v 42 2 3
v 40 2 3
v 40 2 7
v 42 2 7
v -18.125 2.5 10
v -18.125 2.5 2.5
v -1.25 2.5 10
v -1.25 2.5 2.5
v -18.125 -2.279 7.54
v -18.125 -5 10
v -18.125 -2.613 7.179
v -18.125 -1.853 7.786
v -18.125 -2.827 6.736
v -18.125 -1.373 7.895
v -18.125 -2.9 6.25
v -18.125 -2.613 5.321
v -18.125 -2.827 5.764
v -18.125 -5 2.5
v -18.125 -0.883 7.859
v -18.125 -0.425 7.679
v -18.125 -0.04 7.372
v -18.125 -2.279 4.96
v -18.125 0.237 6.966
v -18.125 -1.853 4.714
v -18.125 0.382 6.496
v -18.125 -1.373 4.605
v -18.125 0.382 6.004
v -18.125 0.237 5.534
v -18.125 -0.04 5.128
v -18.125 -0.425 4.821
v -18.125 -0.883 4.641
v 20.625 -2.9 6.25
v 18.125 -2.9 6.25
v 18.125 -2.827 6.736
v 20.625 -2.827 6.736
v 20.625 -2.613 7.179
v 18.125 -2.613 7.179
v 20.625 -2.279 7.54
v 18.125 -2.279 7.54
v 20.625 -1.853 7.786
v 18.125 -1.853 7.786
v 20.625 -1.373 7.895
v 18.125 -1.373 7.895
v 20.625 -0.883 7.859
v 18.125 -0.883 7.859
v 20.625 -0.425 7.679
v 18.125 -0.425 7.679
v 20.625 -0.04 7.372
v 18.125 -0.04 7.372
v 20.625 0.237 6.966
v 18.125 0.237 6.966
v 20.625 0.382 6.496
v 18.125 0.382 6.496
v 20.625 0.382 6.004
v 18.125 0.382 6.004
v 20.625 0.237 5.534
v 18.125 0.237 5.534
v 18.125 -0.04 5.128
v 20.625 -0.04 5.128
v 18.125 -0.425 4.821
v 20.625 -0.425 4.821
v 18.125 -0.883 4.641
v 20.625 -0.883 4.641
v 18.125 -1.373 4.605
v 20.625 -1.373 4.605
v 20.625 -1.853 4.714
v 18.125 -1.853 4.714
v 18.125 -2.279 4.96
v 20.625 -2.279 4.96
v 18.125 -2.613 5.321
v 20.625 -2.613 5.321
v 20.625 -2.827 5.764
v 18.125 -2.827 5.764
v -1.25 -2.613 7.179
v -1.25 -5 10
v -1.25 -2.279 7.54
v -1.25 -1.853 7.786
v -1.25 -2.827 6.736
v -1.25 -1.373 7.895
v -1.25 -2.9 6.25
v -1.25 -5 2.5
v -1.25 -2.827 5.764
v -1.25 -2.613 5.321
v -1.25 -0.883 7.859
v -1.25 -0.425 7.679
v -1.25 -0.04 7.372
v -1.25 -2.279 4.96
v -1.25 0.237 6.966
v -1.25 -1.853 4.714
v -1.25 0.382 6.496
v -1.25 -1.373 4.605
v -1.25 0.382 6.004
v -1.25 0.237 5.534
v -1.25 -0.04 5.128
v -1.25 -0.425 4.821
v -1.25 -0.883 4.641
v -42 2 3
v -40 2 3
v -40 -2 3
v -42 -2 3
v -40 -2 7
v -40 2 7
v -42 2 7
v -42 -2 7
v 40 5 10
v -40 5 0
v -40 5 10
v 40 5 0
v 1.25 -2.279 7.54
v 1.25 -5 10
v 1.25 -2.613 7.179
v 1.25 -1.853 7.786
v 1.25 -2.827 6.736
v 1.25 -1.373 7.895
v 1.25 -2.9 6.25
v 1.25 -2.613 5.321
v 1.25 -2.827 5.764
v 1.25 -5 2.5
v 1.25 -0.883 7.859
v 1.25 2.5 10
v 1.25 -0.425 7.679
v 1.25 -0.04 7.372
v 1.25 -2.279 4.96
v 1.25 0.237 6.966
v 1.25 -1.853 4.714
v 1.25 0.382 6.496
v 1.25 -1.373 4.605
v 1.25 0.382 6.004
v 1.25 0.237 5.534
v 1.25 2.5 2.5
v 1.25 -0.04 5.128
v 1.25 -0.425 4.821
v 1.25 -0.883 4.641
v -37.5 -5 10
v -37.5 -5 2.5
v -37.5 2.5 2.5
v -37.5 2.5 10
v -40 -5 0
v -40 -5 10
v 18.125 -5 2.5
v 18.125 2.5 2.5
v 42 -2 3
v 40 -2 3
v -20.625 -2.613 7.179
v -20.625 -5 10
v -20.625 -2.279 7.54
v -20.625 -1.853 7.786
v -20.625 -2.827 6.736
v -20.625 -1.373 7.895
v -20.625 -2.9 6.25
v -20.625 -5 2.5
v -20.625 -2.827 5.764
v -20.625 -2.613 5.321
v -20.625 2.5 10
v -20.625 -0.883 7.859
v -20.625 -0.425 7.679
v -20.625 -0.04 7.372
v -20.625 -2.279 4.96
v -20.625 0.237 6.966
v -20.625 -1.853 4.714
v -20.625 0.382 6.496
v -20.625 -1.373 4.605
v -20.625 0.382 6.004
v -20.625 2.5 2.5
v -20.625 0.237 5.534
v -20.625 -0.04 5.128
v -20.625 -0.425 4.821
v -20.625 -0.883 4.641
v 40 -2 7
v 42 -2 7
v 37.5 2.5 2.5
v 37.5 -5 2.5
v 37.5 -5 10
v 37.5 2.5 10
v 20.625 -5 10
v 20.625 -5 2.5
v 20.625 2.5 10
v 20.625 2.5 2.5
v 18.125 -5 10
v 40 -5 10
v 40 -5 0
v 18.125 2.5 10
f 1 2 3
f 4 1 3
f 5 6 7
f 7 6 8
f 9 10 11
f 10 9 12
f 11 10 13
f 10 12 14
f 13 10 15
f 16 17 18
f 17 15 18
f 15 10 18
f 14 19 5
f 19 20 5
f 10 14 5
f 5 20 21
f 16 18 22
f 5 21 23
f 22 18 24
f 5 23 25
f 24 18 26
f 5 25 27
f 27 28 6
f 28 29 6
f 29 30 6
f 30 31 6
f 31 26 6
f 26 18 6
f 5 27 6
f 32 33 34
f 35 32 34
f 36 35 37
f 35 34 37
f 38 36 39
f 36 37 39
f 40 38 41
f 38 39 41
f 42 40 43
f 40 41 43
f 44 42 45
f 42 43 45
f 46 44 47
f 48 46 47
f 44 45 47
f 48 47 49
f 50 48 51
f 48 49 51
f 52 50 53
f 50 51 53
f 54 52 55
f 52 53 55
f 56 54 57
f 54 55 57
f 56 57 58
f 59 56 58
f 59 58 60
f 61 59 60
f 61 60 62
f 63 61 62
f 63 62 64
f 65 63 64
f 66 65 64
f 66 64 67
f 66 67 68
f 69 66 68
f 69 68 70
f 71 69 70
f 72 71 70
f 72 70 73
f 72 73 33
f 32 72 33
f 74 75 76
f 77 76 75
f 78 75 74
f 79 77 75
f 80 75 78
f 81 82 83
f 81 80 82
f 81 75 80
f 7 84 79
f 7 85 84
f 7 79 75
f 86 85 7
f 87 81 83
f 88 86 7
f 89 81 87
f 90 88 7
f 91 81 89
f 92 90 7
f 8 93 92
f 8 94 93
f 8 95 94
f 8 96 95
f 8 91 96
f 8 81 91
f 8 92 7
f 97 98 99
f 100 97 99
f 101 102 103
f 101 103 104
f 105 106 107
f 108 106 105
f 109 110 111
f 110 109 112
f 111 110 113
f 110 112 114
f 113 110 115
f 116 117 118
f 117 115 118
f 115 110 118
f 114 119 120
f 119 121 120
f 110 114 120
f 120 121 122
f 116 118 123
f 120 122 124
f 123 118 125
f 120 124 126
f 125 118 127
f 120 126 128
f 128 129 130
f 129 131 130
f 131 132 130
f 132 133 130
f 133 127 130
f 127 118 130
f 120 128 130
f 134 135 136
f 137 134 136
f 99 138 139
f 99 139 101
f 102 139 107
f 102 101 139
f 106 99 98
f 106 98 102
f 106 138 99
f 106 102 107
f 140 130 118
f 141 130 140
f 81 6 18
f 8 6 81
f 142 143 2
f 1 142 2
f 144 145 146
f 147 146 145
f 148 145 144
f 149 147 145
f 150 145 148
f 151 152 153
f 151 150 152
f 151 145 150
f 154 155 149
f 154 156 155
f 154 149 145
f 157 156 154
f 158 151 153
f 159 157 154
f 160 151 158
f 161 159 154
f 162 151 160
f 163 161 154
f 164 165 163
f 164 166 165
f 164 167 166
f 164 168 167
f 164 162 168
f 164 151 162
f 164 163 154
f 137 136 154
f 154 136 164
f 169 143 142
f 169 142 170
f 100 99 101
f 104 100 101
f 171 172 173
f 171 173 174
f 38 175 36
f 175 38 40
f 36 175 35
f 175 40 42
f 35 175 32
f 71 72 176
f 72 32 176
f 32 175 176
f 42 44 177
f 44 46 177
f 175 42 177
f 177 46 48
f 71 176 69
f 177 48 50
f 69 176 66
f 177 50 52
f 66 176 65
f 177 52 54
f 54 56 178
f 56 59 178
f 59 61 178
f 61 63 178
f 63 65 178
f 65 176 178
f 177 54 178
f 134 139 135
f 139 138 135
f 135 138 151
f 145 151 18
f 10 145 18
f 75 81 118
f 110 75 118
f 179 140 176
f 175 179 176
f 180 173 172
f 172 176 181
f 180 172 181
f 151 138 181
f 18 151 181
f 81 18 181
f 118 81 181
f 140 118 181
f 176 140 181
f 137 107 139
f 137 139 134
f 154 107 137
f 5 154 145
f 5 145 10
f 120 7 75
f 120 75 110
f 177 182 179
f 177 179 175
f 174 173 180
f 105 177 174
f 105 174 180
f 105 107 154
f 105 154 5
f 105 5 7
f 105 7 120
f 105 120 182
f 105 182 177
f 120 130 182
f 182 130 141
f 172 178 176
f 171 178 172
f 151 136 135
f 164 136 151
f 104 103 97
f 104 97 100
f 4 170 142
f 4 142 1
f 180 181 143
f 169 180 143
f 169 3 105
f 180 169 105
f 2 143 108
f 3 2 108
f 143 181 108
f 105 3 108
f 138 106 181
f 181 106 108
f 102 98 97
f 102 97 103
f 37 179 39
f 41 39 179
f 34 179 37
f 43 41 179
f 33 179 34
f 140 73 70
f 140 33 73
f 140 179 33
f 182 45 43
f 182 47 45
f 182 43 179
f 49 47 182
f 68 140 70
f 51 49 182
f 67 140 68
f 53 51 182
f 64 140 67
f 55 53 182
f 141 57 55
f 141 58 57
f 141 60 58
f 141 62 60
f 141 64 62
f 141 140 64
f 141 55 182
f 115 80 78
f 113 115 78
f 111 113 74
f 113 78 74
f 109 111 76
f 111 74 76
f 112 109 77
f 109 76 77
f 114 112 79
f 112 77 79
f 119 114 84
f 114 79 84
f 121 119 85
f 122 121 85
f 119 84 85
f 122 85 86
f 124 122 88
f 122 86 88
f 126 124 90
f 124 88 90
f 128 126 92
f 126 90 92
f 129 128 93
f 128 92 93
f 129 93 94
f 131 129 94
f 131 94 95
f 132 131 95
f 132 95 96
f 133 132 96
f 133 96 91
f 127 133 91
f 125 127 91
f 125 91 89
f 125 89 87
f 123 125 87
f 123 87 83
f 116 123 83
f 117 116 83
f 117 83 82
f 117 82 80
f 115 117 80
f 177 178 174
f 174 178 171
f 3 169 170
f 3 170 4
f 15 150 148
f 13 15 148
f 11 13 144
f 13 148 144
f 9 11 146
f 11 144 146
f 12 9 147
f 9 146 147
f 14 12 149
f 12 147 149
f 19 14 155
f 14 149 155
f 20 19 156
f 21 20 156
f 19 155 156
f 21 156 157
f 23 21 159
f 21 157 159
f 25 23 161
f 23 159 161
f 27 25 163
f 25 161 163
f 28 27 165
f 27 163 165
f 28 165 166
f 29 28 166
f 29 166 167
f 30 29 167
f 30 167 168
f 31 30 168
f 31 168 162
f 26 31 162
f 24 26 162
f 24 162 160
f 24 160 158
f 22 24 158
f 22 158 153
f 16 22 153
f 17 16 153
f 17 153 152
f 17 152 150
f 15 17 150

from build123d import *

# Parameters (mm, degrees)
F0_W      = 80
F0_H      = 10
F1_DEPTH  = 10
F2_W      = 4
F2_H      = 4
F3_DEPTH  = 2
F4_W      = 4
F4_H      = 4
F5_DEPTH  = 2
F6_T      = -2.5
F7_W      = 2.5
F7_H      = 7.5
F8_DEPTH  = 7.5
F9_R      = 1.65
F10_DEPTH = 41.25


with BuildPart() as f1:
    # F0 (on Top) → F1 (new body)
    with BuildSketch(Plane.XY):
        Rectangle(F0_W, F0_H)
    extrude(amount=F1_DEPTH)

    # F2 (on face) → F3 (join)
    with BuildSketch(Plane.YZ.offset(40)):
        with Locations((0, 5)):
            Rectangle(F2_W, F2_H)
    extrude(amount=F3_DEPTH)

    # F4 (on face) → F5 (join)
    with BuildSketch(Plane(origin=(-40, 0, 0), x_dir=(0, -1, 0), z_dir=(-1, 0, 0))):
        with Locations((0, 5)):
            Rectangle(F4_W, F4_H)
    extrude(amount=F5_DEPTH)

    # F6
    f6_openings = [f1.faces().sort_by_distance(p)[0] for p in [
        (0, -5, 5),
        (0, 0, 10),
    ]]
    offset(amount=F6_T, openings=f6_openings, kind=Kind.INTERSECTION)

    # F7 (on face) → F8 (join, through all)
    with BuildSketch(Plane.XY.offset(2.5)):
        with Locations((-19.375, -1.25)):
            Rectangle(F7_W, F7_H)
        with Locations((0, -1.25)):
            Rectangle(F7_W, F7_H)
        with Locations((19.375, -1.25)):
            Rectangle(F7_W, F7_H)
    extrude(amount=F8_DEPTH)

    # F9 (on face) → F10 (cut, through all)
    with BuildSketch(Plane(origin=(-20.625, 0, 0), x_dir=(0, -1, 0), z_dir=(-1, 0, 0))):
        with Locations((1.25, 6.25)):
            Circle(F9_R)
    extrude(amount=-F10_DEPTH, mode=Mode.SUBTRACT)


solid = f1.part
